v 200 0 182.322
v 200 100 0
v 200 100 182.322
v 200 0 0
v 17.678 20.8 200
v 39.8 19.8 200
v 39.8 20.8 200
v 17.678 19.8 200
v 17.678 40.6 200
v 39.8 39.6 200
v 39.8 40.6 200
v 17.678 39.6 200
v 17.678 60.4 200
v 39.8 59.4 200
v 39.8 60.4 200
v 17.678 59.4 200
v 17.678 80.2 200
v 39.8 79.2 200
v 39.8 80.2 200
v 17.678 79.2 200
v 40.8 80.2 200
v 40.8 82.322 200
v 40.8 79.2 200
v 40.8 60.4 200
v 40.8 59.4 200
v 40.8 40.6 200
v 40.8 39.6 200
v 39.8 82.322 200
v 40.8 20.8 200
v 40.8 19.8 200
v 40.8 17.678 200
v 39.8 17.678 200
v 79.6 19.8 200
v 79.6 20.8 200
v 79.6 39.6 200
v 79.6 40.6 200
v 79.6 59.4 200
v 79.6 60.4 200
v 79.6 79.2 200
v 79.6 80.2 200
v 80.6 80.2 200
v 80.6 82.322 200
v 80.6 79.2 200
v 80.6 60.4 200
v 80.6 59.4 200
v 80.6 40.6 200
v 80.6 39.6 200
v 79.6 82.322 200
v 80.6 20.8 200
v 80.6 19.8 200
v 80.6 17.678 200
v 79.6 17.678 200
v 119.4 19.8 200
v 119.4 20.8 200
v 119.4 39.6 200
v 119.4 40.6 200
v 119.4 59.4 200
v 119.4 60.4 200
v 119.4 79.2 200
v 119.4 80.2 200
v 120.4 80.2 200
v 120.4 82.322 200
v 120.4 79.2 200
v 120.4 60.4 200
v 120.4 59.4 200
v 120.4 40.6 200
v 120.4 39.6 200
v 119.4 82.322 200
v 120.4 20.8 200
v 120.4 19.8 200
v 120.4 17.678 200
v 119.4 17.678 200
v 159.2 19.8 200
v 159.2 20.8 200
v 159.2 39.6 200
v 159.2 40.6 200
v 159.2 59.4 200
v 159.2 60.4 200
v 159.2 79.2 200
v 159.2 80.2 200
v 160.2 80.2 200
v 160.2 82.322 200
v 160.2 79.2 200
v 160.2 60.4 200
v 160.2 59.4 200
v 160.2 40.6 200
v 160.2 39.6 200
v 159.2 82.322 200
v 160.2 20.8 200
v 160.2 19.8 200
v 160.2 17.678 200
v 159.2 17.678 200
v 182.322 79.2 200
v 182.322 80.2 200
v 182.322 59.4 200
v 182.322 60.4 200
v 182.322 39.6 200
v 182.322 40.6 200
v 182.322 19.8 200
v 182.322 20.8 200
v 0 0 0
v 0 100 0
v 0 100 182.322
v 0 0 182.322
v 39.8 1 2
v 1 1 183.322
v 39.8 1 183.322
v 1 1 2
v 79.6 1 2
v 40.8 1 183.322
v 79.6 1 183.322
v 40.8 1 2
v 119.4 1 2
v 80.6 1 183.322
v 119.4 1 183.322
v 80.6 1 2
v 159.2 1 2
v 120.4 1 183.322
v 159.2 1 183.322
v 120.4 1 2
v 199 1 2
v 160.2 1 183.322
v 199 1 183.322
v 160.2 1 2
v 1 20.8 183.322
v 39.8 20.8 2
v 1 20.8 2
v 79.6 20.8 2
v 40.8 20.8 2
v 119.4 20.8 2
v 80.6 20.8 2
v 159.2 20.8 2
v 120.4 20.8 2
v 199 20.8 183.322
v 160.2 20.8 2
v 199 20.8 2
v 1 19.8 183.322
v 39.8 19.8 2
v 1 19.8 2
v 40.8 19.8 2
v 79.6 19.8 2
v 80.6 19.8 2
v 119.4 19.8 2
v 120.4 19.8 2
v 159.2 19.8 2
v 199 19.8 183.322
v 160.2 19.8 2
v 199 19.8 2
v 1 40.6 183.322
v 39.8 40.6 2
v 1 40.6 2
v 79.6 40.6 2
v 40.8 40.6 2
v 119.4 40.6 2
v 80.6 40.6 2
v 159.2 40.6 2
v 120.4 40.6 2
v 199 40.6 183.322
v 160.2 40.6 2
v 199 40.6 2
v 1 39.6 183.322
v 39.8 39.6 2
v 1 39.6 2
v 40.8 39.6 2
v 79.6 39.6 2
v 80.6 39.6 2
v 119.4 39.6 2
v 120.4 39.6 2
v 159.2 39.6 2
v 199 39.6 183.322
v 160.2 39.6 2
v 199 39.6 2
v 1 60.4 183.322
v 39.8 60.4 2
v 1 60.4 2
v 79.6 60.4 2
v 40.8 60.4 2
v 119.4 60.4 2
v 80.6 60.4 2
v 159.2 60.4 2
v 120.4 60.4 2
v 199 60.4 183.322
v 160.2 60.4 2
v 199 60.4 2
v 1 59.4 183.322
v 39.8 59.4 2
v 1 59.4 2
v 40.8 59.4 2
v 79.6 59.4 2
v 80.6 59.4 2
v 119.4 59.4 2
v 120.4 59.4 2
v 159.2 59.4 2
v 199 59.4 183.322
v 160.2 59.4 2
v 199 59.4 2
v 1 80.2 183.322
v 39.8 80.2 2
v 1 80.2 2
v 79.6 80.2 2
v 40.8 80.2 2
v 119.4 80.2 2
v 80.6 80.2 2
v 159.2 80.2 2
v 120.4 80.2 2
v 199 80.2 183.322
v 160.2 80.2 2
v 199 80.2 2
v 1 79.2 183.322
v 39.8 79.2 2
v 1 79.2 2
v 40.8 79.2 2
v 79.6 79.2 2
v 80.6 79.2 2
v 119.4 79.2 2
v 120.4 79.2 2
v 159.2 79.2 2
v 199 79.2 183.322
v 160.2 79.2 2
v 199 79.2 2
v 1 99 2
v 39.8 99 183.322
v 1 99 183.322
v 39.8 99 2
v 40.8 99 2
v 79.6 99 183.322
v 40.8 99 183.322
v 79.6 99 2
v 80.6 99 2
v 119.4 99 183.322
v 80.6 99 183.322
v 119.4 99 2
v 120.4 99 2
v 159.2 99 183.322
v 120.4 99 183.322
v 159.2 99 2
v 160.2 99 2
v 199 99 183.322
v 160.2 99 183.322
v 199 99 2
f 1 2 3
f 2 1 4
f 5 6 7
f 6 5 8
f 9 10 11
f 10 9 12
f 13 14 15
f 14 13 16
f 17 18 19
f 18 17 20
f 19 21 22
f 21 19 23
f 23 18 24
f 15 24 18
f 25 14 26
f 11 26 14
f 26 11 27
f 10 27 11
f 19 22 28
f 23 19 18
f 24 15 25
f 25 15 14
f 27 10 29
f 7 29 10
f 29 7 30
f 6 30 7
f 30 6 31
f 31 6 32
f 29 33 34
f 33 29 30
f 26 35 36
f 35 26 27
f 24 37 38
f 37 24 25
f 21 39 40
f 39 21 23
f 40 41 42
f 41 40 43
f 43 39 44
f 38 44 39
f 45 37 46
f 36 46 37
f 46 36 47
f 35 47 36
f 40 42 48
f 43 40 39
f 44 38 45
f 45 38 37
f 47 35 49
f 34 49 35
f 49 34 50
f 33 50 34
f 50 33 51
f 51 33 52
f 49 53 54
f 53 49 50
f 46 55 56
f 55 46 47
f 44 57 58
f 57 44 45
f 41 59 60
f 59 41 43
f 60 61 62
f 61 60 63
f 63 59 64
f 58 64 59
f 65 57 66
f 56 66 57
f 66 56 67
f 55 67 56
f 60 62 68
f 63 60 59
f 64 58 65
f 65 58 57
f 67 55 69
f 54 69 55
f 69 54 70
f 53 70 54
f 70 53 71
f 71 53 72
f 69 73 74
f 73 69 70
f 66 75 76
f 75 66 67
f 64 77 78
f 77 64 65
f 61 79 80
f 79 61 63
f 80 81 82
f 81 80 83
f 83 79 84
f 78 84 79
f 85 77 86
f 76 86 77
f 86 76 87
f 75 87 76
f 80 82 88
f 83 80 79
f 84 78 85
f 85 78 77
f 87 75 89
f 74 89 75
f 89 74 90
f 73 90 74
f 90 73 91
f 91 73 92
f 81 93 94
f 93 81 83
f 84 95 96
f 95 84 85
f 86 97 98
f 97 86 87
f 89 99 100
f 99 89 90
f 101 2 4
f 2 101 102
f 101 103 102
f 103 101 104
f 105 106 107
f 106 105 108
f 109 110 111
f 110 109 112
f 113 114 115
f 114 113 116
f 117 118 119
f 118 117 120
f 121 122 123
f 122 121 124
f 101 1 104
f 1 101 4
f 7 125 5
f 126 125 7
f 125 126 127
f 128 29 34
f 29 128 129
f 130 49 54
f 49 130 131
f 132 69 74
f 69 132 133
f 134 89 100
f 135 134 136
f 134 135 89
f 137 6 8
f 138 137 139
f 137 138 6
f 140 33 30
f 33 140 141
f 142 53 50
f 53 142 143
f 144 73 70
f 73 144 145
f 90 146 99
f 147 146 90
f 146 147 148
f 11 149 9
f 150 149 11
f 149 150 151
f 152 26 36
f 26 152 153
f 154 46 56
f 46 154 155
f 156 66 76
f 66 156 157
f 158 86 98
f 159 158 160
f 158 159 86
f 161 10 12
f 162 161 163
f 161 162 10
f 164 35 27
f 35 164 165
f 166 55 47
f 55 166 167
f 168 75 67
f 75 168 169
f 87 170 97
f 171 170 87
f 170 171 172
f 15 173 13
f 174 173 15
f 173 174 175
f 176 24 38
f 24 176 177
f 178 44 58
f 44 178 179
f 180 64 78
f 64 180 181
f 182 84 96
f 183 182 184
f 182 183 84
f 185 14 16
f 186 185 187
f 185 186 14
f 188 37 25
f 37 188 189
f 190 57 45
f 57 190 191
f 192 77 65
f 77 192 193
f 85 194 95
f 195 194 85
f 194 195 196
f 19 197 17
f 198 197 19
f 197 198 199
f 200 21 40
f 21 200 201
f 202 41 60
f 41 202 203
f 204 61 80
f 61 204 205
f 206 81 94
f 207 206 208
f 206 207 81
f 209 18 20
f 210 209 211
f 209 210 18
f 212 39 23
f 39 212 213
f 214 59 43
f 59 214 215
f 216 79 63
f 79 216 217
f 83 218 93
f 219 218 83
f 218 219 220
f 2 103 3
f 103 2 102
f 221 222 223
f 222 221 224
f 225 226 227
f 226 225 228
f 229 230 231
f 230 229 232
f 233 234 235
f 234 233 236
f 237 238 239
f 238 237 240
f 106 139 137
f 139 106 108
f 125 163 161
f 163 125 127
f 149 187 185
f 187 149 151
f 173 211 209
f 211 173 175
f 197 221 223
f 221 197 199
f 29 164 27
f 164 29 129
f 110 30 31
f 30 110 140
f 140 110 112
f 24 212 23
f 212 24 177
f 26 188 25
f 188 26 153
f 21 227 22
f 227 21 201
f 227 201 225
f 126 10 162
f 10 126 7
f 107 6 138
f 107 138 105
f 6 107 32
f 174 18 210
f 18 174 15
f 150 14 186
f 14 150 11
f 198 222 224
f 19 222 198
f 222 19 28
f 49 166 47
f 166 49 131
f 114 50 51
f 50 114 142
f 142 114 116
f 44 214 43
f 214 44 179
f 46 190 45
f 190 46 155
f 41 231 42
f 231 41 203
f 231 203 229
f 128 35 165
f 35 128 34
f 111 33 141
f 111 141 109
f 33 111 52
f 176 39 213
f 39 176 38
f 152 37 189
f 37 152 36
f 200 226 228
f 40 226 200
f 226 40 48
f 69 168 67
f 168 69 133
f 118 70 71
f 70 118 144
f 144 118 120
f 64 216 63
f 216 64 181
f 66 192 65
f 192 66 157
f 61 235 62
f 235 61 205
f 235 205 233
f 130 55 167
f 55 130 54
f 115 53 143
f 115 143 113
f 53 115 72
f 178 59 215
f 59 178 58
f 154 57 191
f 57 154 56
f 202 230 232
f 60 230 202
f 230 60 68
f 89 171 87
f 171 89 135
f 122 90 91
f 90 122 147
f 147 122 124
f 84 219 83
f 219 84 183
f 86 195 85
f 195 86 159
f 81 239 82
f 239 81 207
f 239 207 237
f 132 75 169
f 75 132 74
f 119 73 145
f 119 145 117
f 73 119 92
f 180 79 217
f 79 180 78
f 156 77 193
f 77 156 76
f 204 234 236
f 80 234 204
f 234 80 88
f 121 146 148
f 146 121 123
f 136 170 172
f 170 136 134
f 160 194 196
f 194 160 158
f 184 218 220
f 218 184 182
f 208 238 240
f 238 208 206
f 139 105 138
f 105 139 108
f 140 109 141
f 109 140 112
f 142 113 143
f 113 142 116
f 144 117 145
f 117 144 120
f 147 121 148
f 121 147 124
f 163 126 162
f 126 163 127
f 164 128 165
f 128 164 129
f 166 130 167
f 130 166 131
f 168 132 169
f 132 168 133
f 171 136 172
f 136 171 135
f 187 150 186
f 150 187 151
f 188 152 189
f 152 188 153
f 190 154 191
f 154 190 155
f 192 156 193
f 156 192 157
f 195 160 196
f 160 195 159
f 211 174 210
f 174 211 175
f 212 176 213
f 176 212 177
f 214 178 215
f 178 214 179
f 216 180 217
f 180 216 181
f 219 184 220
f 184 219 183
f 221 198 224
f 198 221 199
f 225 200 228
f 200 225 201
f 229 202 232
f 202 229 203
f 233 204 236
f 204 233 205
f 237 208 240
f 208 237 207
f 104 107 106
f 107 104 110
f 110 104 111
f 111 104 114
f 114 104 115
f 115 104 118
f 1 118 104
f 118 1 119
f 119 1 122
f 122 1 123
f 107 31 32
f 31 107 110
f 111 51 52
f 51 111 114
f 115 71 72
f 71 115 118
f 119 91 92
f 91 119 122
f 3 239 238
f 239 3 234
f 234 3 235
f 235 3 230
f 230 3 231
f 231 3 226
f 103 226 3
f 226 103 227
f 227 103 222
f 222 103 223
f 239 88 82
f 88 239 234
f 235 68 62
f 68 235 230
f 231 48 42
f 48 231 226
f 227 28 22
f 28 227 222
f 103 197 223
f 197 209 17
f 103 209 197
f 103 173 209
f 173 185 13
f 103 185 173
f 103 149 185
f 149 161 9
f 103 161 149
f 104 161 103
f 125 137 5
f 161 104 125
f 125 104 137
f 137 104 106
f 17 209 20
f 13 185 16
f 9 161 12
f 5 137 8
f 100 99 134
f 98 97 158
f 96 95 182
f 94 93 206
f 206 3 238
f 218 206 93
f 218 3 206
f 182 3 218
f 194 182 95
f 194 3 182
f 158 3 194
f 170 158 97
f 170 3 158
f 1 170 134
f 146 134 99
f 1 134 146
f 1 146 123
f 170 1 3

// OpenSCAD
// X Length of the box
size_x=200;
// Y Length of the box
size_y=100;
// Height of the box
height=200;
// Number of rows of dividers
num_rows=5;
// Number of columns of dividers
num_columns=5;
// Wall thickness
wall_thickness=1;
// Base thickness (if applicable)
base_thickness=2;
// Bevel size on the X edge
bevel_size_x=25;
// Bevel size on the Y edge
bevel_size_y=25;

// Do you want a base on the box?
Base=1; // [1,0]
// Do you want a bevel on the X edge?
Bevel_X=1; // [1,0]
// Do you want a bevel on the Y edge?
Bevel_Y=1; // [1,0]

row_height=(size_x-wall_thickness)/num_rows;
column_width=(size_y-wall_thickness)/num_columns;

difference(){

    union(){

        for (i = [1 : 1 : num_columns+1]){
    
  translate([0, column_width*i-column_width, 0]) cube(size = [size_x,wall_thickness,height], center = false);

};

        for (i = [1 : 1 : num_rows+1]){
    
  translate([row_height*i-row_height, 0, 0]) cube(size = [wall_thickness,size_y,height], center = false);

};
if (Base==1) {
    cube(size = [size_x,size_y,base_thickness], center = false);
}
};

if (Bevel_X==1) {
translate([size_x/2, 0, height]) rotate(a=45, v=[1,0,0]) cube([size_x+10, bevel_size_x, bevel_size_x], center = true);
}

if (Bevel_X==1) {
translate([size_x/2, size_y, height]) rotate(a=45, v=[1,0,0]) cube([size_x+10, bevel_size_x, bevel_size_x], center = true);
}
if (Bevel_Y==1) {
translate([0, size_y/2, height]) rotate(a=45, v=[0,1,0]) cube([bevel_size_y, size_y+10, bevel_size_y], center = true);
}
if (Bevel_Y==1) {
translate([size_x, size_y/2, height]) rotate(a=45, v=[0,1,0]) cube([bevel_size_y, size_y+10, bevel_size_y], center = true);
}
};
